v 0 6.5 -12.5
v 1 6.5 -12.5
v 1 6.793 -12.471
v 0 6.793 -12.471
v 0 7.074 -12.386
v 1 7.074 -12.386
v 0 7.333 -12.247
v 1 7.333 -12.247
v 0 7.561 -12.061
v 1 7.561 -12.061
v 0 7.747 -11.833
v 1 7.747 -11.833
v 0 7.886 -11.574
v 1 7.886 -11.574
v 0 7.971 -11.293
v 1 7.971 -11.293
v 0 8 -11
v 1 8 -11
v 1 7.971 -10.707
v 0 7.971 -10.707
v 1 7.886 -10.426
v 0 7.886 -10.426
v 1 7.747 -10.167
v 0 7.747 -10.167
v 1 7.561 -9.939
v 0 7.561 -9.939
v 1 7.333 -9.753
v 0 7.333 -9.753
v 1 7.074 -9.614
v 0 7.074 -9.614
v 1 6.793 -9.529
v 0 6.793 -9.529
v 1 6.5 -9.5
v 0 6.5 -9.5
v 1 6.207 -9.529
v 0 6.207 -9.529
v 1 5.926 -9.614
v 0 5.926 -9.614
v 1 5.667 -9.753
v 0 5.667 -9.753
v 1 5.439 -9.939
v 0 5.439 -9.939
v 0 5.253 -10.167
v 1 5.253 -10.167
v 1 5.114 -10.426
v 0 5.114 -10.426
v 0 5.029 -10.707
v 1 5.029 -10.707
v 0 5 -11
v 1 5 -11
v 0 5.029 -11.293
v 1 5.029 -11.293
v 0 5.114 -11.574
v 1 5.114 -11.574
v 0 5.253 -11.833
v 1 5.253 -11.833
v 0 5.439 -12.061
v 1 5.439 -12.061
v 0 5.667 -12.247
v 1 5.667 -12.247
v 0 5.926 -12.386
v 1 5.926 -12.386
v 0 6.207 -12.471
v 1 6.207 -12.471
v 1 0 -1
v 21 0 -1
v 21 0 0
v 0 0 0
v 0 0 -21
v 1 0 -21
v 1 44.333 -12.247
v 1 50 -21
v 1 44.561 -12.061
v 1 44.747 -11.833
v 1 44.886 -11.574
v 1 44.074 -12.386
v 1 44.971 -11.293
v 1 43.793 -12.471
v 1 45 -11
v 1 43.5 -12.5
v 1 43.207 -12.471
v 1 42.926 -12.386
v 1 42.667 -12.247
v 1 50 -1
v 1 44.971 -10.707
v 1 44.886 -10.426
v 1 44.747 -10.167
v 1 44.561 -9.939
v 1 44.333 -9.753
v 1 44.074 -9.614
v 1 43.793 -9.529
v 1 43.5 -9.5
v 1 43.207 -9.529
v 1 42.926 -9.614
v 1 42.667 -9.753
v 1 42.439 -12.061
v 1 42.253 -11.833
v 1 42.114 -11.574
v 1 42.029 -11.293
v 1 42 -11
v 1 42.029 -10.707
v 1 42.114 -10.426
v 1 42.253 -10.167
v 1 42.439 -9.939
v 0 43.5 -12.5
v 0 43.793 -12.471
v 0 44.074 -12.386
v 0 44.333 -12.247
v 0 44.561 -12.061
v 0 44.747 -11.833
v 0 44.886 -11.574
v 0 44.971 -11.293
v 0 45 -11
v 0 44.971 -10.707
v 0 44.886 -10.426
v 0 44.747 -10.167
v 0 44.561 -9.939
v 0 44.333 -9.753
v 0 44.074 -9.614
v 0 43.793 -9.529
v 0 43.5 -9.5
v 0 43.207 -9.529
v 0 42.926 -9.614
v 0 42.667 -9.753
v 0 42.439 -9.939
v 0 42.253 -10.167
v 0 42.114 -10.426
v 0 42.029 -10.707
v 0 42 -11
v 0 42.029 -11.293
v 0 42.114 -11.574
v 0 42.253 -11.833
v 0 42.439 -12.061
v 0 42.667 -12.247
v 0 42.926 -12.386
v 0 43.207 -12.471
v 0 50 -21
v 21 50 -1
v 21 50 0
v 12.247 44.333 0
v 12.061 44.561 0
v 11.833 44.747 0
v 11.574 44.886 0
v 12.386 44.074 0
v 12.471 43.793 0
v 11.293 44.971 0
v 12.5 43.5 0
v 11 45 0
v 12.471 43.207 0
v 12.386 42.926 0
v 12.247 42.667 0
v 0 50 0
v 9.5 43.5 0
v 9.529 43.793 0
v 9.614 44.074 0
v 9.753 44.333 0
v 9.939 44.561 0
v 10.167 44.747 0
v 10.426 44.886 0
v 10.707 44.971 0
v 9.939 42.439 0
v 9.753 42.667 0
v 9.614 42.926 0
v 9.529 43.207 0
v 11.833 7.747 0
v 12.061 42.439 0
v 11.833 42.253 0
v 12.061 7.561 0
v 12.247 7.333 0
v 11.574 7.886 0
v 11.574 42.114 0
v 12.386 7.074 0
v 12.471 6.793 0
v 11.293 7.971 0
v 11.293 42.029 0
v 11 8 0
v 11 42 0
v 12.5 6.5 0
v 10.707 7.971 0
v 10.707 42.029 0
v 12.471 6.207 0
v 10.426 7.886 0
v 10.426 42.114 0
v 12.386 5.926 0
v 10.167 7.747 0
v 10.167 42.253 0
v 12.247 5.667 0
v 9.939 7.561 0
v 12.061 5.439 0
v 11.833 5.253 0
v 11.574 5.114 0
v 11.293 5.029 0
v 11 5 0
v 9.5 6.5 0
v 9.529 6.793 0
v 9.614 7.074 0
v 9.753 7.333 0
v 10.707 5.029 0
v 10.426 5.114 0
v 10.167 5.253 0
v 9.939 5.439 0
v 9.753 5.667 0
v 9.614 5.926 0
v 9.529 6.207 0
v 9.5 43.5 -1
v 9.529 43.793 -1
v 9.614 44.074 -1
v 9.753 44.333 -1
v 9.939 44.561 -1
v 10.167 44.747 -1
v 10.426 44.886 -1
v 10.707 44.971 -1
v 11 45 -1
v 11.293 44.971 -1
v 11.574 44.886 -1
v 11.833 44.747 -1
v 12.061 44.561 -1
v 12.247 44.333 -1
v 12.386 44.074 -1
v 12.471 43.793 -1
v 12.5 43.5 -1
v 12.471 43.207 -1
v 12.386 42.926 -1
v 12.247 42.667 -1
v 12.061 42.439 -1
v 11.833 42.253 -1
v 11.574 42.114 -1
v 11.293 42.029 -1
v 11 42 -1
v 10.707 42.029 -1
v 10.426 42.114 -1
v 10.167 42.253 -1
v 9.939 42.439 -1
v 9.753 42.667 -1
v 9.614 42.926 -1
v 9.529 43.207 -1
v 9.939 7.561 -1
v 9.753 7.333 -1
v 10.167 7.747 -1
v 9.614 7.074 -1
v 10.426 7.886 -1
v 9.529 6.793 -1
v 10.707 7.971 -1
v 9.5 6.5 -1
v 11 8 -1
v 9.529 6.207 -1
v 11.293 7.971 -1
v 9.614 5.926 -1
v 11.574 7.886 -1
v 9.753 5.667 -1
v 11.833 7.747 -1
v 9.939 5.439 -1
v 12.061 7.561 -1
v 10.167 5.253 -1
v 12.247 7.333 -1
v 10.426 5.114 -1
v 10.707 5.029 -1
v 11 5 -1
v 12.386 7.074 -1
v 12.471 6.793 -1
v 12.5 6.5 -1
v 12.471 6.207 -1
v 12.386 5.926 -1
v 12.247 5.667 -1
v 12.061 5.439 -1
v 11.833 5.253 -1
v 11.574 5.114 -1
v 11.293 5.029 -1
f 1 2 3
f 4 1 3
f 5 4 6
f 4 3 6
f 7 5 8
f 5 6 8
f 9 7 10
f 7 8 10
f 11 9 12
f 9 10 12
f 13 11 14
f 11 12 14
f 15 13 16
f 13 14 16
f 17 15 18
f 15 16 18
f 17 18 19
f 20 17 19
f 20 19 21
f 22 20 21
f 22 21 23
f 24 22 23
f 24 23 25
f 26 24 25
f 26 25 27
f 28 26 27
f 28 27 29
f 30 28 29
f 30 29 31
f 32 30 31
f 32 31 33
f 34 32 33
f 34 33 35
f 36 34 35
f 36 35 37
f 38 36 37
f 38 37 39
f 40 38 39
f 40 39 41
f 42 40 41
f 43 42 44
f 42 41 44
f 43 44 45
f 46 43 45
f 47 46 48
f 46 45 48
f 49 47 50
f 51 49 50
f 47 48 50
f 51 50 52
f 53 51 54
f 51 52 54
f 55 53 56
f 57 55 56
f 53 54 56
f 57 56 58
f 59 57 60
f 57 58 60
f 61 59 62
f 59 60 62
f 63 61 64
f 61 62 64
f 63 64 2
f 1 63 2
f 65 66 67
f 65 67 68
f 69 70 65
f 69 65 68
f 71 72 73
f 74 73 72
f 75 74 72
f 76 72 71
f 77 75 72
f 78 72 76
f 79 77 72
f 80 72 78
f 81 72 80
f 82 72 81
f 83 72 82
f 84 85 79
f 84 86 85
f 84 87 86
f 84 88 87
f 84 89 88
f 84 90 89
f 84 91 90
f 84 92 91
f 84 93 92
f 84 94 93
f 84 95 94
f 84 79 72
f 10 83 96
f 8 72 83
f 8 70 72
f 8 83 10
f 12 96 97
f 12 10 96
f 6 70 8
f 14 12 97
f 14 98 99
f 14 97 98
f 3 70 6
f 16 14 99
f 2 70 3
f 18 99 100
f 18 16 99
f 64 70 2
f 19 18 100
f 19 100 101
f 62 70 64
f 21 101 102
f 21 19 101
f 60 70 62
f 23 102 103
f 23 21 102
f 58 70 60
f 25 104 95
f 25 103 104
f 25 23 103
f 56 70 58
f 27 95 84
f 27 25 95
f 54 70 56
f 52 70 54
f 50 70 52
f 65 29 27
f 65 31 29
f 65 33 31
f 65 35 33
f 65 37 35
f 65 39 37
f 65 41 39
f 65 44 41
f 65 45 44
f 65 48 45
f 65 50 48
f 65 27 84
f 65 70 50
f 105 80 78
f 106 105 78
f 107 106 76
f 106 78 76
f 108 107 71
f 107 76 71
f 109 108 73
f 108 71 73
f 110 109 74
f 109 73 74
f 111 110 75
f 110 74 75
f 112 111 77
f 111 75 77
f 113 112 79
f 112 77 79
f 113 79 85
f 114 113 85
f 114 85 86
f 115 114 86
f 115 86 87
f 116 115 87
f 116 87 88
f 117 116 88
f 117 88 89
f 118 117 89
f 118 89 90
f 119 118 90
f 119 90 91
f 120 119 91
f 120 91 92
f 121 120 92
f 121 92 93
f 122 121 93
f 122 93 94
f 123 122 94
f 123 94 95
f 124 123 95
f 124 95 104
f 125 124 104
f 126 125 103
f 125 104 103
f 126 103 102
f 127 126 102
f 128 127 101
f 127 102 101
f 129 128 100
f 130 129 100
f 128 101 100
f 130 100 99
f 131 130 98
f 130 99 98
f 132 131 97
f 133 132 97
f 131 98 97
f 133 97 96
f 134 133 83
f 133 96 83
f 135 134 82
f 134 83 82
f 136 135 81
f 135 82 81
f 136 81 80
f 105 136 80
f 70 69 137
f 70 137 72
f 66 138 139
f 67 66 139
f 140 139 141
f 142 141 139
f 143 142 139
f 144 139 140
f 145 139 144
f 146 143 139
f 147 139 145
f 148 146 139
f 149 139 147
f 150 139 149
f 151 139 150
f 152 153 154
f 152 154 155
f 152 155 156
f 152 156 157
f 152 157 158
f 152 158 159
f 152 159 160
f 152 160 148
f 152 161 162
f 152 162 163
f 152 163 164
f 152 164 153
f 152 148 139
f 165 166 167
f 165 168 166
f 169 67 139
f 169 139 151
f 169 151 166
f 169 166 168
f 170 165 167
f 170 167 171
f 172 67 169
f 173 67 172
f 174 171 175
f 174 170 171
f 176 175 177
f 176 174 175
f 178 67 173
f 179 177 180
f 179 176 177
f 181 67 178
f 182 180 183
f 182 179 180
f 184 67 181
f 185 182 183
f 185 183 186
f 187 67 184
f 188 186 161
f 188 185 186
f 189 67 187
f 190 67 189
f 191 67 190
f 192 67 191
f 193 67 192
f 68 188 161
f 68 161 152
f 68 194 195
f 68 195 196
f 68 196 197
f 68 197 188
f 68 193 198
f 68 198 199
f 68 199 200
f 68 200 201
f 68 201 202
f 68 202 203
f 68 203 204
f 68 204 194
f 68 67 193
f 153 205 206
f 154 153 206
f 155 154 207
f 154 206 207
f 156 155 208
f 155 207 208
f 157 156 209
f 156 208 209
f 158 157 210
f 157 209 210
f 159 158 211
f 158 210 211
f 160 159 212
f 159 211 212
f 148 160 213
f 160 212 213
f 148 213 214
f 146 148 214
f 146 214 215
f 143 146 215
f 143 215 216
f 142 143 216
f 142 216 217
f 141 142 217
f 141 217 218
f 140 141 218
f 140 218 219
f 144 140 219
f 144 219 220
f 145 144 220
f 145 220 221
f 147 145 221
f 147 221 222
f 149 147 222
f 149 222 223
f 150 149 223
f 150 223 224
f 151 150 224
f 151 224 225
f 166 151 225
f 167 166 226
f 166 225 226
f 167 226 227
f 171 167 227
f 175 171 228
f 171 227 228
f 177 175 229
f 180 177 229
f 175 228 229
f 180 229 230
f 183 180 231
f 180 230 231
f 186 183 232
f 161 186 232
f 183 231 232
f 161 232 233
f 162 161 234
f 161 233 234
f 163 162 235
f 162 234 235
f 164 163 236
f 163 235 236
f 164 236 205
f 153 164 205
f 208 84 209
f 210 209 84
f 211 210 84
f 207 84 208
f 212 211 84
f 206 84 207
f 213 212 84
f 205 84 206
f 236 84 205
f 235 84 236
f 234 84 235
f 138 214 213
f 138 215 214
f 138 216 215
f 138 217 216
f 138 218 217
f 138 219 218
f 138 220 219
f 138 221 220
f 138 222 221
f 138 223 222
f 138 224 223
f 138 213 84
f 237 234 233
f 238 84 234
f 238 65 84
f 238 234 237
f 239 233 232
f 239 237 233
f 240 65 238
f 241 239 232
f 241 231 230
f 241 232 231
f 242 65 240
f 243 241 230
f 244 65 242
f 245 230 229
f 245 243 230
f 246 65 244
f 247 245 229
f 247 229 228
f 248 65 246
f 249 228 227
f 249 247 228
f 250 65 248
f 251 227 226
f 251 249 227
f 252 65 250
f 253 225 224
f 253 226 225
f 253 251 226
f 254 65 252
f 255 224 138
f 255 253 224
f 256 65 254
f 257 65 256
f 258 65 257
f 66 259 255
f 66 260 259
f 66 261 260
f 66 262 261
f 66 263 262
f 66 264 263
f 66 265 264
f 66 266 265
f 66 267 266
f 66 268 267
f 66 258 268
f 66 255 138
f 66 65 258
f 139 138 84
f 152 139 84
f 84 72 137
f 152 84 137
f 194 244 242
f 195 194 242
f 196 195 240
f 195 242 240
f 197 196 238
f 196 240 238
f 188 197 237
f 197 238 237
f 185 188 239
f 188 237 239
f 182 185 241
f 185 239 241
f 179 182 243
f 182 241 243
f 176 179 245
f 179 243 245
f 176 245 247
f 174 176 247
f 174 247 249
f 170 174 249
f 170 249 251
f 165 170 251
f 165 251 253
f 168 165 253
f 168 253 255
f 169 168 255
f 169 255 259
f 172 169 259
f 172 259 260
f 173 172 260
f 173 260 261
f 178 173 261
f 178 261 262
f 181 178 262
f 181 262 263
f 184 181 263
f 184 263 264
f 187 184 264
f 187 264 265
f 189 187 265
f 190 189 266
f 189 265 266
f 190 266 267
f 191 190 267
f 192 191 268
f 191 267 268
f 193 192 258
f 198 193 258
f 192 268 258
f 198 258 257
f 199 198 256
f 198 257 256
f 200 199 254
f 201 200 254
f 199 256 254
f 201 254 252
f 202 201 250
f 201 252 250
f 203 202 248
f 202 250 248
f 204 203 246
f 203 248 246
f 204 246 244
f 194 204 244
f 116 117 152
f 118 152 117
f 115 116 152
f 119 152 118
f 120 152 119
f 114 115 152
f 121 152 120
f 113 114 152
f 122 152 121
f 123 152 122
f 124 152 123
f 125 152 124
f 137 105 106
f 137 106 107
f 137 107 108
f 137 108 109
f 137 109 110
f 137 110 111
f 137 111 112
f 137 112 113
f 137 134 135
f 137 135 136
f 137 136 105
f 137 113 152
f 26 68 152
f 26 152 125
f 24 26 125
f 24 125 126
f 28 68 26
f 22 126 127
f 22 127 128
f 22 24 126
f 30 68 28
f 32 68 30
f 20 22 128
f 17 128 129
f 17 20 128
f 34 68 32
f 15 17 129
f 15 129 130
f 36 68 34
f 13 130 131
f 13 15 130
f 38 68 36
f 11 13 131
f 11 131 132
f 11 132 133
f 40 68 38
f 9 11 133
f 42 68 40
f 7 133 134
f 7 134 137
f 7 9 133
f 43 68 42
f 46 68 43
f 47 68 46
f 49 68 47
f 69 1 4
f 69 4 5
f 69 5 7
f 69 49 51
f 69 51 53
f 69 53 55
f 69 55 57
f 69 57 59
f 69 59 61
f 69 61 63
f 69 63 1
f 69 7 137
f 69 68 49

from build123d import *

# Parameters (mm, degrees)
EXTRUSION1_DEPTH = 50
EXTRUSION2_REACH = 3
ESQUISSE2_R      = 1.5
EXTRUSION3_REACH = 3
ESQUISSE3_R      = 1.5


with BuildPart() as part:
    # Esquisse1 → Extrusion1 (new body)
    with BuildSketch(Plane(origin=(0, 0, 0), x_dir=(1, 0, 0), z_dir=(0, 1, 0))):
        Polygon((0, 0), (0, 21), (1, 21), (1, 1), (21, 1), (21, 0), align=None)
    extrude(amount=EXTRUSION1_DEPTH)

    # Esquisse2 → Extrusion2 (cut, up to next)
    with BuildSketch(Plane(origin=(1, 0, 0), x_dir=(0, 0, -1), z_dir=(1, 0, 0)), mode=Mode.PRIVATE) as extrusion2_sk1:
        with Locations((11, 6.5)):
            Circle(ESQUISSE2_R)
    extrusion2_tool1 = extrude(extrusion2_sk1.sketch, amount=-EXTRUSION2_REACH, mode=Mode.PRIVATE) & part.part
    add(extrusion2_tool1.solids().sort_by_distance((1, 6.5, -11))[0], mode=Mode.SUBTRACT)
    # Esquisse2 → Extrusion2 (cut, up to next)
    with BuildSketch(Plane(origin=(1, 0, 0), x_dir=(0, 0, -1), z_dir=(1, 0, 0)), mode=Mode.PRIVATE) as extrusion2_sk2:
        with Locations((11, 43.5)):
            Circle(ESQUISSE2_R)
    extrusion2_tool2 = extrude(extrusion2_sk2.sketch, amount=-EXTRUSION2_REACH, mode=Mode.PRIVATE) & part.part
    add(extrusion2_tool2.solids().sort_by_distance((1, 43.5, -11))[0], mode=Mode.SUBTRACT)

    # Esquisse3 → Extrusion3 (cut, up to next)
    with BuildSketch(Plane(origin=(0, 0, -1), x_dir=(-1, 0, 0), z_dir=(0, 0, -1)), mode=Mode.PRIVATE) as extrusion3_sk1:
        with Locations((-11, 43.5)):
            Circle(ESQUISSE3_R)
    extrusion3_tool1 = extrude(extrusion3_sk1.sketch, amount=-EXTRUSION3_REACH, mode=Mode.PRIVATE) & part.part
    add(extrusion3_tool1.solids().sort_by_distance((11, 43.5, -1))[0], mode=Mode.SUBTRACT)
    # Esquisse3 → Extrusion3 (cut, up to next)
    with BuildSketch(Plane(origin=(0, 0, -1), x_dir=(-1, 0, 0), z_dir=(0, 0, -1)), mode=Mode.PRIVATE) as extrusion3_sk2:
        with Locations((-11, 6.5)):
            Circle(ESQUISSE3_R)
    extrusion3_tool2 = extrude(extrusion3_sk2.sketch, amount=-EXTRUSION3_REACH, mode=Mode.PRIVATE) & part.part
    add(extrusion3_tool2.solids().sort_by_distance((11, 6.5, -1))[0], mode=Mode.SUBTRACT)


solid = part.part
